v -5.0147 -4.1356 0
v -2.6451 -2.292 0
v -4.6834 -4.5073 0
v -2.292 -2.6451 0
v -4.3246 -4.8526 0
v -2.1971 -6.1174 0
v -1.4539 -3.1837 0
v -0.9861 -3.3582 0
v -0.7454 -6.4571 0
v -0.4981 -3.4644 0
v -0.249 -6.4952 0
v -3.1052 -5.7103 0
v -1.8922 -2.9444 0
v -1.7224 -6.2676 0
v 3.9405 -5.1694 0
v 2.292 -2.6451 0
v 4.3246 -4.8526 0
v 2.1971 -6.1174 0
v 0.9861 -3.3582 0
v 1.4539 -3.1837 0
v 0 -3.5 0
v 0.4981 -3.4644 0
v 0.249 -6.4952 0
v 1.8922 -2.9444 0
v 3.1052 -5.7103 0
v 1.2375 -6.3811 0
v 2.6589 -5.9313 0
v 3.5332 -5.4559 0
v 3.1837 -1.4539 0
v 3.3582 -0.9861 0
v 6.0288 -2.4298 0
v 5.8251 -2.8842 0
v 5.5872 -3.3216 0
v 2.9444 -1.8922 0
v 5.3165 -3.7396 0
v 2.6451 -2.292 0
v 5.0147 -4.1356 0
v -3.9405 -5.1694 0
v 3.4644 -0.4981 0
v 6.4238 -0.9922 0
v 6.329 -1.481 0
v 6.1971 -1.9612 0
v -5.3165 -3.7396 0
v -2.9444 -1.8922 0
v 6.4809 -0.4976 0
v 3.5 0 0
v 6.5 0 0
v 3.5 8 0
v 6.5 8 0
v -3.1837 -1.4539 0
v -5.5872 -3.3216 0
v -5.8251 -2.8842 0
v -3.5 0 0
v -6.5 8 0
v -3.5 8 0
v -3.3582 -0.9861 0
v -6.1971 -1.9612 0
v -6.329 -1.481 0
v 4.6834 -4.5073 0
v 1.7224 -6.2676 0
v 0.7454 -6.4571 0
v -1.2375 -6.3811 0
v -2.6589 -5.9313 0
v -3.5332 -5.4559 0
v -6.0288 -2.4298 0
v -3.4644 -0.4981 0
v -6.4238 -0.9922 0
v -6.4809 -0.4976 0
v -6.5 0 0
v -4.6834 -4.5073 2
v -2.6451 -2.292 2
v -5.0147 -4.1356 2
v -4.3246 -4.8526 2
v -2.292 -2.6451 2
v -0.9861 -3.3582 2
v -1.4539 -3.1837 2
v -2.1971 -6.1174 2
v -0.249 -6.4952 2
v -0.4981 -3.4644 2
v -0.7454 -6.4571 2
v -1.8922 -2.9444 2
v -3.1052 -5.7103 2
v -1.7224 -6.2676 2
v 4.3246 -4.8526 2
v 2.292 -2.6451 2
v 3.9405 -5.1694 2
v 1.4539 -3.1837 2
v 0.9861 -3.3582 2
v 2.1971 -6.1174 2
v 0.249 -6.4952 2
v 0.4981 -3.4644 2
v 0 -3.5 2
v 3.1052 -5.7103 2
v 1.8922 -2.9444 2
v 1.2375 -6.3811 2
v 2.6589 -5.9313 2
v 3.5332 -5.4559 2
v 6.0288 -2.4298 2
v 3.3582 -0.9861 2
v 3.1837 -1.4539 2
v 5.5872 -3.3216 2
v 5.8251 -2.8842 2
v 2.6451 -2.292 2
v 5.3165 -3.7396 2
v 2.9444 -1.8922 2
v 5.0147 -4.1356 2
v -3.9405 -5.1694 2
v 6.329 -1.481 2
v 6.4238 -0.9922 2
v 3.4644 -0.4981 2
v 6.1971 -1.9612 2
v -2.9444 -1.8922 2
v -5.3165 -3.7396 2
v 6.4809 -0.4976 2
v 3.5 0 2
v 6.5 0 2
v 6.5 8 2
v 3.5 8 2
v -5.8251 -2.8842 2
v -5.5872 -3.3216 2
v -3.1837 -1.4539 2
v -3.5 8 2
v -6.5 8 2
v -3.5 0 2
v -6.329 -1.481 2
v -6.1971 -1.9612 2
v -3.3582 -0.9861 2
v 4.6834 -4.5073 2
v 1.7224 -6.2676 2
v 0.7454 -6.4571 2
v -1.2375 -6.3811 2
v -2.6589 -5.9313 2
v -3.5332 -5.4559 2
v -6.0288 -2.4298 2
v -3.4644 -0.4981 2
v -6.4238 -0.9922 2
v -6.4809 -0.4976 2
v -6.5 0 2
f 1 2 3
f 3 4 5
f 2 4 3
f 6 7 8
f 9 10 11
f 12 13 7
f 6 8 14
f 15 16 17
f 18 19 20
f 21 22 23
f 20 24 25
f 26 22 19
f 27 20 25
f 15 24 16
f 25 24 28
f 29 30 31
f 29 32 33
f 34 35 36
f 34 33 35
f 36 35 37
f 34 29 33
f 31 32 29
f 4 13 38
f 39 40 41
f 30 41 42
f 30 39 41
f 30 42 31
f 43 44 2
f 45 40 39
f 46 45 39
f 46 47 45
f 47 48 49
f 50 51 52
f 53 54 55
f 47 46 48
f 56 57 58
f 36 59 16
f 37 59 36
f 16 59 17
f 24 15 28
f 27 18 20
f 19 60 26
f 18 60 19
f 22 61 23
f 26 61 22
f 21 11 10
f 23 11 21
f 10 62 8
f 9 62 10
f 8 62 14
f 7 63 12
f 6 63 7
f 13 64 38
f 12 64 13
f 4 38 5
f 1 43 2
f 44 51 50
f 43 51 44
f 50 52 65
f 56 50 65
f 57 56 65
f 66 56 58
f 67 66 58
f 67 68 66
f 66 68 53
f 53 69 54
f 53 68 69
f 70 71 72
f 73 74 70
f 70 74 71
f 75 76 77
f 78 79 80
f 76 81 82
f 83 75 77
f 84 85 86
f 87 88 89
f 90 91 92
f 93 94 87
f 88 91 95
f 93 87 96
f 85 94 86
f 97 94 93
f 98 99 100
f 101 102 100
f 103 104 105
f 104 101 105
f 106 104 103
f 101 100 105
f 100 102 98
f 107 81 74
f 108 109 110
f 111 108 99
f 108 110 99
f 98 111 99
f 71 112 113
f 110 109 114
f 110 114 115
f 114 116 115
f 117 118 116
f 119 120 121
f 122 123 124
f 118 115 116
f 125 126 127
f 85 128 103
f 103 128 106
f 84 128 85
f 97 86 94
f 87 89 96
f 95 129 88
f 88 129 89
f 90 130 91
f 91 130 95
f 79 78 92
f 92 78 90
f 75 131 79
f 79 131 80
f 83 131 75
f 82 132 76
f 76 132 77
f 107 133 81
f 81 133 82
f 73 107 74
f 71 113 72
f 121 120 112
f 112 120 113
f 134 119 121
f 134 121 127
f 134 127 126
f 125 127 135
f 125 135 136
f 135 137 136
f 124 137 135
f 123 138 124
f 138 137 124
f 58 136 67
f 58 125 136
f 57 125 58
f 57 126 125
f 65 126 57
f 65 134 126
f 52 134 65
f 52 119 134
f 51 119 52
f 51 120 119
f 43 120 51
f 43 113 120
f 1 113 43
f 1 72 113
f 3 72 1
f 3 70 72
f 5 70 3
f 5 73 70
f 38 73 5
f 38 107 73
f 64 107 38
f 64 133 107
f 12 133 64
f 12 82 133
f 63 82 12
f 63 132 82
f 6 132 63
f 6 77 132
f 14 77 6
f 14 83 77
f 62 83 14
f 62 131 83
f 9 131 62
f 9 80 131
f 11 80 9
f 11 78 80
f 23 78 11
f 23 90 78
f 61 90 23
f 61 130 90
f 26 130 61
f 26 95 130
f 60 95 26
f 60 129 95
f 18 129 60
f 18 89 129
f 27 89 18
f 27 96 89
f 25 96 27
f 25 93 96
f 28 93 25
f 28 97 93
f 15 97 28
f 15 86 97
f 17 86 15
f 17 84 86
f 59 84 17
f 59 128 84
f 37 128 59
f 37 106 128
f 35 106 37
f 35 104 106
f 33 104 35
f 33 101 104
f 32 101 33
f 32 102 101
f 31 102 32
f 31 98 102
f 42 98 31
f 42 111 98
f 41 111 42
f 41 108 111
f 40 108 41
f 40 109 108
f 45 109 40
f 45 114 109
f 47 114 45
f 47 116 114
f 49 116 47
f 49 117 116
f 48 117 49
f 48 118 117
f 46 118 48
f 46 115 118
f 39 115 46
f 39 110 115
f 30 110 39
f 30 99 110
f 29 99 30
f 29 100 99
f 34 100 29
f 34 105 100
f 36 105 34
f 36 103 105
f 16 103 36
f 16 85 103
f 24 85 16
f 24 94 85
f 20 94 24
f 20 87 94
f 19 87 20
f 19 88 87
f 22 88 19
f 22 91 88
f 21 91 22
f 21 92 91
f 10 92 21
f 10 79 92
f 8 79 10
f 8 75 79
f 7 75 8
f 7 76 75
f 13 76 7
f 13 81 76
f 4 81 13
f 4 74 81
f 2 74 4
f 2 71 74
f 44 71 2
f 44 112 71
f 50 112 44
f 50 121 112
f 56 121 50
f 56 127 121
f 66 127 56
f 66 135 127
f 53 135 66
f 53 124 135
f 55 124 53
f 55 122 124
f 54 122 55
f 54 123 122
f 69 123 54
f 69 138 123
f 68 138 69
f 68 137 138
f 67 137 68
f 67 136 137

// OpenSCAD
$fs=1/2;
$fa=1/2;
inner=7;
outer=13;
thickness=2;
length=8;
wall=(outer-inner)/2;
linear_extrude(thickness) {
  difference() {
    circle(d=outer);
    circle(d=inner);
    translate([0,outer/2])square([outer,outer],center=true);
  }
  translate([inner/2,0])square([wall,length]);
  translate([-outer/2,0])square([wall,length]);
}
